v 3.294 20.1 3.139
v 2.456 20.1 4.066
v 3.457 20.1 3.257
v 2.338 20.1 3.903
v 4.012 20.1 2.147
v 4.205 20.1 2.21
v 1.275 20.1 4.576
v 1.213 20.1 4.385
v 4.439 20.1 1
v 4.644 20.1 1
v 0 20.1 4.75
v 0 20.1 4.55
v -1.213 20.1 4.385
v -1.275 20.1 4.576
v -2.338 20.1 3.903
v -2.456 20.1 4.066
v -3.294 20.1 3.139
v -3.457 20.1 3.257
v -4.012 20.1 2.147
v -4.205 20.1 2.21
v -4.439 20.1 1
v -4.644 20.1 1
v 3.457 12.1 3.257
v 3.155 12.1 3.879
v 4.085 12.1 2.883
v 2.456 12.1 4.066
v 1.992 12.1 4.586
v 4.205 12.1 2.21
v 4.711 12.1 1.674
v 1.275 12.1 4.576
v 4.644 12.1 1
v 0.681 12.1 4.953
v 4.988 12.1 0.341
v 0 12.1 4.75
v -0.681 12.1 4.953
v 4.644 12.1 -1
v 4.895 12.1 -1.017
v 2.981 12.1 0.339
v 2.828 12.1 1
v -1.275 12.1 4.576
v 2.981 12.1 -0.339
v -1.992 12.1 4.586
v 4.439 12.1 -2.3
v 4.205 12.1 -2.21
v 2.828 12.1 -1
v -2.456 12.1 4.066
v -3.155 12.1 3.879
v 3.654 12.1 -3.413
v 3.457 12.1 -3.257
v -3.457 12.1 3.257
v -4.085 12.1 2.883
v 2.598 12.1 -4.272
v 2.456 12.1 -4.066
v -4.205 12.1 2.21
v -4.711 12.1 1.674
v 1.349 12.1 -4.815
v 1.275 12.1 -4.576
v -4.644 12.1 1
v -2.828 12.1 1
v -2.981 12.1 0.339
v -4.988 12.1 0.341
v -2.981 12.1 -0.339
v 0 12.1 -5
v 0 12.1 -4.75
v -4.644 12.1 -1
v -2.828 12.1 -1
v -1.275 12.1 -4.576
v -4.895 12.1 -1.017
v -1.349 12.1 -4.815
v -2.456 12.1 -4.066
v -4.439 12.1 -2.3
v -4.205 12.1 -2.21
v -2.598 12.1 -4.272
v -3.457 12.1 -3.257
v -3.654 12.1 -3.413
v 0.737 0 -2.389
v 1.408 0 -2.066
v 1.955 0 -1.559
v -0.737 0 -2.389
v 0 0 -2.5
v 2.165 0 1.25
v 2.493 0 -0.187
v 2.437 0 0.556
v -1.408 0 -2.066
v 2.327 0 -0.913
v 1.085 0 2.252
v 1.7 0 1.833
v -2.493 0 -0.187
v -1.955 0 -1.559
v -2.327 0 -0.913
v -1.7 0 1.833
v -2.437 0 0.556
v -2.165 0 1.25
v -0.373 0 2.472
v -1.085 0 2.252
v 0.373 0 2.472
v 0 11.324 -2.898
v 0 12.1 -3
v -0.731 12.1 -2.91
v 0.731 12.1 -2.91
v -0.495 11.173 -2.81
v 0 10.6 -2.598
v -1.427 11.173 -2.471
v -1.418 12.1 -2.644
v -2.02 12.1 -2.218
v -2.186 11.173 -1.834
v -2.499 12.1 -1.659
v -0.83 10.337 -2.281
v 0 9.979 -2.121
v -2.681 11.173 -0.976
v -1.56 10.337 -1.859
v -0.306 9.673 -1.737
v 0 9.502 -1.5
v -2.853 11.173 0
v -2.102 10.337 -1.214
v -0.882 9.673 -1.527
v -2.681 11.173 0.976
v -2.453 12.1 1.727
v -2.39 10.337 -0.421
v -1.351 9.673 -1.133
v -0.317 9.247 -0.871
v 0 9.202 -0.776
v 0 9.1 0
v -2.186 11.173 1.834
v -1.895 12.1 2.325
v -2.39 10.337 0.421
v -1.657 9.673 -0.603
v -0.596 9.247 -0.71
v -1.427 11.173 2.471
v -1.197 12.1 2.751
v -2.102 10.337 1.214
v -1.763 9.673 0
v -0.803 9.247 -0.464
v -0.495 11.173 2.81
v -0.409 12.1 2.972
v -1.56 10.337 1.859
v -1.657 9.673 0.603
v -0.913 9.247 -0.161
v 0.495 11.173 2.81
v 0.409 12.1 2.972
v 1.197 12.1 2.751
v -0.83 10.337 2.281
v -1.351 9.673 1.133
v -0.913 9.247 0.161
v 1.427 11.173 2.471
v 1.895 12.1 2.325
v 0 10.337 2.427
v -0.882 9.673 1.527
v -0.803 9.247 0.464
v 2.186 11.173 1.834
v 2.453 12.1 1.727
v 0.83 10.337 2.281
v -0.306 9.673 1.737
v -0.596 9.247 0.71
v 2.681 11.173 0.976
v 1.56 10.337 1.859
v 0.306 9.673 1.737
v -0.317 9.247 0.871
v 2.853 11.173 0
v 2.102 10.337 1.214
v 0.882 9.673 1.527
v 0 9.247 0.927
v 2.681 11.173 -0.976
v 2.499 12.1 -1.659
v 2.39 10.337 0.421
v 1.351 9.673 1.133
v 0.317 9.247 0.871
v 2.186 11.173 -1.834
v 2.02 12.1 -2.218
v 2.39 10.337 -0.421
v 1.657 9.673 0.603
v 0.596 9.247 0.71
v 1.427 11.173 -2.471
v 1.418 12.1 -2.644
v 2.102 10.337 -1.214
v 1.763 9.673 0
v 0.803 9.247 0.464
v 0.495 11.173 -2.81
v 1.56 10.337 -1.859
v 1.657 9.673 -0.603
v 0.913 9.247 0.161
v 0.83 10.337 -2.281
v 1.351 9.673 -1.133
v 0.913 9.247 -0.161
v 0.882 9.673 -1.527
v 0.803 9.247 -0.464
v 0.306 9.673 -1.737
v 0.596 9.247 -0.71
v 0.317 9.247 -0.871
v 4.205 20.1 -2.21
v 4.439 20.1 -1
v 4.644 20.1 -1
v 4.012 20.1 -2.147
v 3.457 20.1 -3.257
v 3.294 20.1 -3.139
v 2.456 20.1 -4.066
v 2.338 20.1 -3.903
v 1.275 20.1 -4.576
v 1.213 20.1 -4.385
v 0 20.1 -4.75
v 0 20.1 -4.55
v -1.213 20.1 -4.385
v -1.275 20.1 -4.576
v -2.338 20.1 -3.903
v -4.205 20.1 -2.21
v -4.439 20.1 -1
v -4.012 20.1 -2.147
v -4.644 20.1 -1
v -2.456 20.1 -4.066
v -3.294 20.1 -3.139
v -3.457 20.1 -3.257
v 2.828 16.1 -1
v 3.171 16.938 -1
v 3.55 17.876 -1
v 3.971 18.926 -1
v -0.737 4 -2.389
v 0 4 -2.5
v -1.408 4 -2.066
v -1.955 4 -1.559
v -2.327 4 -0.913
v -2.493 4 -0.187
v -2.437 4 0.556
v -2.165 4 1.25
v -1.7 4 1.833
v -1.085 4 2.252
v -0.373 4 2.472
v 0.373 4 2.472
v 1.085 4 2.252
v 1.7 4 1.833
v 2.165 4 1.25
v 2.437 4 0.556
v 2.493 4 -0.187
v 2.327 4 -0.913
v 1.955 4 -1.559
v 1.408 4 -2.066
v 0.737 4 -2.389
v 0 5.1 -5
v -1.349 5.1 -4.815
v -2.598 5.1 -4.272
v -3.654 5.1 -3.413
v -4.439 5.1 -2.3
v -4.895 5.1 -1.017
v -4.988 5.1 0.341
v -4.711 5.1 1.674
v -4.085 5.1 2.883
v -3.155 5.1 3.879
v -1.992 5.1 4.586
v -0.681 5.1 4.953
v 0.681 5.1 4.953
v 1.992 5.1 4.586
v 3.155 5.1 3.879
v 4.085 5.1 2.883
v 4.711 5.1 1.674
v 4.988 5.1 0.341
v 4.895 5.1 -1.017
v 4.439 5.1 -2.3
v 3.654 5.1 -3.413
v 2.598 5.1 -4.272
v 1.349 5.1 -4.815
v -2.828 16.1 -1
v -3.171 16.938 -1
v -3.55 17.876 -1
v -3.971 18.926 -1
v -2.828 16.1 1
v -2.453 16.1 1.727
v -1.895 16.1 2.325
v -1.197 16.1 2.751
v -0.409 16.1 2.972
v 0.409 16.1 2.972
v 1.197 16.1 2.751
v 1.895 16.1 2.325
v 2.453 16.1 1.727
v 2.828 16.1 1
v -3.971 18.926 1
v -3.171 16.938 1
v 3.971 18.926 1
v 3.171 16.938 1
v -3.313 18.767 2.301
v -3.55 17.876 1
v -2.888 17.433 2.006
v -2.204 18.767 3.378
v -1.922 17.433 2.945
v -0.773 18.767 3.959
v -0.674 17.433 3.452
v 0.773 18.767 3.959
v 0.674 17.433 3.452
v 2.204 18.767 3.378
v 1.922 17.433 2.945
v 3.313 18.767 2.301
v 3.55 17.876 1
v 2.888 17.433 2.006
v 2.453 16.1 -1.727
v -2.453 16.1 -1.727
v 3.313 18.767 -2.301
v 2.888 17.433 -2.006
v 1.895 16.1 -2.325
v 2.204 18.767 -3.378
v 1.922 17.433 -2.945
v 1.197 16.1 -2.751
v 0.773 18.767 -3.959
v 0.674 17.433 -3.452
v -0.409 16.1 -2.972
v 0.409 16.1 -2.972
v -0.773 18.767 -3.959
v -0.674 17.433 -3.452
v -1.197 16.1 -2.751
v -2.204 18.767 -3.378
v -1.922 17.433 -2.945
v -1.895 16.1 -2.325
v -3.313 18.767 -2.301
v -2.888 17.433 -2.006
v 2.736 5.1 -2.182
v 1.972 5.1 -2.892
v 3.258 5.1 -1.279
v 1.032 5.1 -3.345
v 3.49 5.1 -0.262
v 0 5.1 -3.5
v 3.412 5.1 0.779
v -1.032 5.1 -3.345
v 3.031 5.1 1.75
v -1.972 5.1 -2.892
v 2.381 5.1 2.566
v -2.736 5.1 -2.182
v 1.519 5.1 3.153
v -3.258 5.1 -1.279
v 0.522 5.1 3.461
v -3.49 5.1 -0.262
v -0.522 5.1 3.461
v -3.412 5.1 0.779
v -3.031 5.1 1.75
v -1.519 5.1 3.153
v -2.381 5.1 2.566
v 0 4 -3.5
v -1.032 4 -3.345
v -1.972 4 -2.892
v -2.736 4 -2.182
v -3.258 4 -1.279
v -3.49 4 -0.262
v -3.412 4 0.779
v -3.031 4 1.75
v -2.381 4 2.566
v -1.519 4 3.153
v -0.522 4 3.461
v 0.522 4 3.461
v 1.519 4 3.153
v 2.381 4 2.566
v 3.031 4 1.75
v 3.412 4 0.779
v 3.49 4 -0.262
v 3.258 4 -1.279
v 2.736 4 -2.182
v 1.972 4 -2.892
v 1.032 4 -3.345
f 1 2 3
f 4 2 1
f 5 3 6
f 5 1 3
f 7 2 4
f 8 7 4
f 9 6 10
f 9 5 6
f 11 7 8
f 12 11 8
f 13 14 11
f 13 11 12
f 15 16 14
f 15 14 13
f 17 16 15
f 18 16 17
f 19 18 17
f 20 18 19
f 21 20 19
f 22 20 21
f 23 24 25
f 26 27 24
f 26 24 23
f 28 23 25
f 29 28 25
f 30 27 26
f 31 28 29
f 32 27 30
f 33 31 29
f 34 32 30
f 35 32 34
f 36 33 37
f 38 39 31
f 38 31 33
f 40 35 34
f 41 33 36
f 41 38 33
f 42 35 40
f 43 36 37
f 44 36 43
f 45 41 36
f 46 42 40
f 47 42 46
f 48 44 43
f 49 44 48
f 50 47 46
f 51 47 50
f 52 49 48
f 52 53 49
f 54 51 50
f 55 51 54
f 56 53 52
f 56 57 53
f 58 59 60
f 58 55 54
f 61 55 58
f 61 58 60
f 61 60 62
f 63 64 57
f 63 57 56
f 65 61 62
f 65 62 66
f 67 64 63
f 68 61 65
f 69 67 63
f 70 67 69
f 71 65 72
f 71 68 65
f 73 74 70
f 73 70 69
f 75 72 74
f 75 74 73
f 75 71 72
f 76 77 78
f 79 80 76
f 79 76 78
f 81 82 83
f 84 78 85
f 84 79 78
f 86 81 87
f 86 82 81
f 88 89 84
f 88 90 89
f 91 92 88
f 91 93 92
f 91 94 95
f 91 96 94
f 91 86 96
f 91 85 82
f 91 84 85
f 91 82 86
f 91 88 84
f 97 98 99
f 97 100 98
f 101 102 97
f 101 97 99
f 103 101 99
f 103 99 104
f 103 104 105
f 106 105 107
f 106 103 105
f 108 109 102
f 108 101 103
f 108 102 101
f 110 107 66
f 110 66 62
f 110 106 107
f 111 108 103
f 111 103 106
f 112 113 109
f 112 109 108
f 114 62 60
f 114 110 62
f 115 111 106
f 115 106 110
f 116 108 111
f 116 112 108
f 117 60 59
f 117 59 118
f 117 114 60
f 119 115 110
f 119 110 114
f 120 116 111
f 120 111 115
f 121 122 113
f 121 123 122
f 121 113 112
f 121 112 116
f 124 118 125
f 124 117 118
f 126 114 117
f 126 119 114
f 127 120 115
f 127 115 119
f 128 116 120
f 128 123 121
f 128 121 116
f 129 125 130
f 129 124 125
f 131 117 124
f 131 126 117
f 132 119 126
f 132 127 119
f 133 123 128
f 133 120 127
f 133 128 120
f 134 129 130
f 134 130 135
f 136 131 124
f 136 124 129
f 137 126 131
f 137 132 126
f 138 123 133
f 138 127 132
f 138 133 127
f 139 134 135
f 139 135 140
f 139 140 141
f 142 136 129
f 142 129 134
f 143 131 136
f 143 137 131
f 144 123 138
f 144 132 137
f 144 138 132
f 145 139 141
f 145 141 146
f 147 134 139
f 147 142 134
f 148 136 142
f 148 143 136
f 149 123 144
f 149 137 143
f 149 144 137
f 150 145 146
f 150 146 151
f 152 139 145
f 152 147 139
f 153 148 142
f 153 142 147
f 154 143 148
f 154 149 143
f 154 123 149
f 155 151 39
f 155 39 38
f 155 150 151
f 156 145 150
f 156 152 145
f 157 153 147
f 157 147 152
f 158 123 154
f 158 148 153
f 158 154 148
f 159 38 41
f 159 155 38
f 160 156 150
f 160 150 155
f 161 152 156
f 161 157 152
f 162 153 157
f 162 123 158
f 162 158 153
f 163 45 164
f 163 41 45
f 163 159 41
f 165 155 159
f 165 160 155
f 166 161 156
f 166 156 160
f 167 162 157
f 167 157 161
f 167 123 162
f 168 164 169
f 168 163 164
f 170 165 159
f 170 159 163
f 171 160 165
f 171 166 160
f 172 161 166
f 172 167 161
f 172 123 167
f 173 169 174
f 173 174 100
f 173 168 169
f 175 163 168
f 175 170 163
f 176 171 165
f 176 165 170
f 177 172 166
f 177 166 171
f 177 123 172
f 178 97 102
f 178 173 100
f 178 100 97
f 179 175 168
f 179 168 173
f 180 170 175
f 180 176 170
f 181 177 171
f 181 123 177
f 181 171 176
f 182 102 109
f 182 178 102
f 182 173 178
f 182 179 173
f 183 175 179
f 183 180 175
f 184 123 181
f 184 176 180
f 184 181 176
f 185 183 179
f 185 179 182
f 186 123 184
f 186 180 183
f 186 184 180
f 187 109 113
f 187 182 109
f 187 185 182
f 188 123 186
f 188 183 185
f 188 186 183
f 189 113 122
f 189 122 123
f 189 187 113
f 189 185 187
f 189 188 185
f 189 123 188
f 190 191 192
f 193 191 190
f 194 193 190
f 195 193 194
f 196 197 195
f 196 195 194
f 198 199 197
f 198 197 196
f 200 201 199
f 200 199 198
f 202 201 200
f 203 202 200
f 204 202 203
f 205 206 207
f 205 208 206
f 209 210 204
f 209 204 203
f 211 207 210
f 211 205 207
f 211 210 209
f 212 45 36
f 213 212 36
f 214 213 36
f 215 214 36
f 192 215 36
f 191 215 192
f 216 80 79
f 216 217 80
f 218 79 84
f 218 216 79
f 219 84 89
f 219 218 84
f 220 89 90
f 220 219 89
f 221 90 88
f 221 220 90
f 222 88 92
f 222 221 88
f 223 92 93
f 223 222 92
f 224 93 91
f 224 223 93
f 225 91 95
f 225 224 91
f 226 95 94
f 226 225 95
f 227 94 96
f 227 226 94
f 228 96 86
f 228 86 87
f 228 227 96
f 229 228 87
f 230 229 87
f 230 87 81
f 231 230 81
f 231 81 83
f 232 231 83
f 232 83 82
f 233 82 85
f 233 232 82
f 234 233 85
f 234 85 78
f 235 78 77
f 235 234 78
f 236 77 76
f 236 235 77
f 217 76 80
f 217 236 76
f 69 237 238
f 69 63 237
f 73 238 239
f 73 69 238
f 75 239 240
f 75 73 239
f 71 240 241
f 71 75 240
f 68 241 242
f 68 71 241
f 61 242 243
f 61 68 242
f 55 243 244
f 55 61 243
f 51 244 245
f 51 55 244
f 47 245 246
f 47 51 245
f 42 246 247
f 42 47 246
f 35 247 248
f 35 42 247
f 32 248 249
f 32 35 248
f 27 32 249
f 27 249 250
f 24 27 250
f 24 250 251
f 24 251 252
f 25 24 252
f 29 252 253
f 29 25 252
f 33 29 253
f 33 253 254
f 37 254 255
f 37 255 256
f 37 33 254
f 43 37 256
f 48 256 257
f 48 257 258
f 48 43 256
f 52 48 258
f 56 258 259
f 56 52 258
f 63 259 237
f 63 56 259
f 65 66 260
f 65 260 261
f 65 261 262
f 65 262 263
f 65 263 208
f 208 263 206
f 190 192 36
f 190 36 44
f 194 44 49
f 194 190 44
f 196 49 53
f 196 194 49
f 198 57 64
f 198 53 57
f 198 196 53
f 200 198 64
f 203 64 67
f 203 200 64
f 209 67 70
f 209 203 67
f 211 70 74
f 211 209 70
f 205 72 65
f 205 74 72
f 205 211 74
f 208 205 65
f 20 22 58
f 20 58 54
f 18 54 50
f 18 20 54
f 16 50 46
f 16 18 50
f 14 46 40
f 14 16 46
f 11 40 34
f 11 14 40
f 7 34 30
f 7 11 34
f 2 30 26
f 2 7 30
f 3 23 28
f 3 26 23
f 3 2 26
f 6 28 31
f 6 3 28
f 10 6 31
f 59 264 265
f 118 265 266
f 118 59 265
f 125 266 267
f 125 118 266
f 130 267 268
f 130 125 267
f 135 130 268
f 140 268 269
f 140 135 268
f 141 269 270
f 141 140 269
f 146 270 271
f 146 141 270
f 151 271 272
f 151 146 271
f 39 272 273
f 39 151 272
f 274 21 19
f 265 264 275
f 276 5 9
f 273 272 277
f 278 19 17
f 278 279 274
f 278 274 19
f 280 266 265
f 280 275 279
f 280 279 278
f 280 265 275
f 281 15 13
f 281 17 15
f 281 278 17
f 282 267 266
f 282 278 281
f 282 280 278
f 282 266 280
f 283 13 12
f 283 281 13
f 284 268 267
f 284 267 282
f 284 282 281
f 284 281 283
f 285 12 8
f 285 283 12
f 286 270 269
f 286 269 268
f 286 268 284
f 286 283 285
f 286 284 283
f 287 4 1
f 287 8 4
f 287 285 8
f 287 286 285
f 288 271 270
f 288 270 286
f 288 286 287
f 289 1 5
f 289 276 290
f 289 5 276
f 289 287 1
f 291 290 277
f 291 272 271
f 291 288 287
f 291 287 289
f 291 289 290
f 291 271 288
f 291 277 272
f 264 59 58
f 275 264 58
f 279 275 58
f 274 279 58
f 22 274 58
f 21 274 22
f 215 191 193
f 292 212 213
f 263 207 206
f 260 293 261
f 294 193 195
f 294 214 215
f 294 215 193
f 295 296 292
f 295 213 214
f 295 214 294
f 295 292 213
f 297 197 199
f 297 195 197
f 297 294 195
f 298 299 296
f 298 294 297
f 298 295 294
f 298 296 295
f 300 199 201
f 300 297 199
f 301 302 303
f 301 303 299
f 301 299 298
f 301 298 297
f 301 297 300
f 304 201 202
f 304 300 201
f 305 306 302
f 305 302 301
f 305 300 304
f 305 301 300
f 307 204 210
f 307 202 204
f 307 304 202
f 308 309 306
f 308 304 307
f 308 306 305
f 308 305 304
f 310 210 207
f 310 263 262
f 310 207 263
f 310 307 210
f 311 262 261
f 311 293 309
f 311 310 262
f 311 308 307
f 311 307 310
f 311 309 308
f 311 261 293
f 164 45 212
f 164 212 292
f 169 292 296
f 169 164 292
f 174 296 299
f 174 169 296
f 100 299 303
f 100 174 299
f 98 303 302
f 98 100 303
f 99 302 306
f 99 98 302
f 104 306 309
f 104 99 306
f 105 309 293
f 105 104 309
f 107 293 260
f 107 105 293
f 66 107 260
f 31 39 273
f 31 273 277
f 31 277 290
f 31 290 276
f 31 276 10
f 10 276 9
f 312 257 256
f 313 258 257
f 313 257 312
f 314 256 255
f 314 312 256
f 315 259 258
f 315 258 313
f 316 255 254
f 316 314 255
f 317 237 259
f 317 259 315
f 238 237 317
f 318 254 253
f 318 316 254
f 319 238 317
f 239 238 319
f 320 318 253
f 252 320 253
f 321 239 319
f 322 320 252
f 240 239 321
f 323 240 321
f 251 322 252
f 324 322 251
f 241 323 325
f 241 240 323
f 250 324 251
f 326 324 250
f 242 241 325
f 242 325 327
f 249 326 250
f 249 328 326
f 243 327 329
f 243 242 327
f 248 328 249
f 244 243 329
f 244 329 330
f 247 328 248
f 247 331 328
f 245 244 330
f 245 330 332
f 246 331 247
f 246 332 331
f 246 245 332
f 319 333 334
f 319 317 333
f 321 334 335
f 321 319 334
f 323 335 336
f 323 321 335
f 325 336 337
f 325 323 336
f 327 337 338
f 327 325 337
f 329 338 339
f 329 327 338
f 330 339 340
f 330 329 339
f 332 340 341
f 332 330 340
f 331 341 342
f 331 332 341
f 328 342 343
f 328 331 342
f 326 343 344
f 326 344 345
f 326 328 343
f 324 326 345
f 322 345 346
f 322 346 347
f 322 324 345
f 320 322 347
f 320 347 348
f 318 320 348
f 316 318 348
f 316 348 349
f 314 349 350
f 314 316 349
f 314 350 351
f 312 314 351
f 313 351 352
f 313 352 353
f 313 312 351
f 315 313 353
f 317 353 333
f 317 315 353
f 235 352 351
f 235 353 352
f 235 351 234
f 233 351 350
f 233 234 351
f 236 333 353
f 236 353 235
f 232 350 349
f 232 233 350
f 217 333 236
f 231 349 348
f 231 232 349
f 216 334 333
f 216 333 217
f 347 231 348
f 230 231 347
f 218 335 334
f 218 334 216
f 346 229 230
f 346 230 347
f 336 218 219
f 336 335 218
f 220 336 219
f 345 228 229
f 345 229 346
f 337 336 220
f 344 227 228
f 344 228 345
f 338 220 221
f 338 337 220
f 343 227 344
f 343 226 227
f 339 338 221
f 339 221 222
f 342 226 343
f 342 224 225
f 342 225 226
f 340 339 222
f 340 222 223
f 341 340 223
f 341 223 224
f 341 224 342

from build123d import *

# Parameters (mm, degrees)
ENL_V_MAT_EXTRU_1_REACH             = 23.308
ESQUISSE2_W                         = 2
ESQUISSE2_H                         = 8
ENL_V_MAT_EXTRU_1_DIRECTION_2_REACH = 23.308


with BuildPart() as part:
    # Esquisse1 → Révolution1 (revolve)
    with BuildSketch(Plane.XY, mode=Mode.PRIVATE) as r_volution1_sk:
        with BuildLine():
            Line((0, 0), (-2.5, 0))
            Line((-2.5, 0), (-2.5, 4))
            Line((-2.5, 4), (-3.5, 4))
            Line((-3.5, 4), (-3.5, 5.1))
            Line((-3.5, 5.1), (-5, 5.1))
            Line((-5, 5.1), (-5, 12.1))
            Line((-5, 12.1), (-4.75, 12.1))
            Line((-4.75, 12.1), (-4.75, 20.1))
            Line((-4.75, 20.1), (-4.55, 20.1))
            Line((-4.55, 20.1), (-3, 16.1))
            Line((-3, 16.1), (-3, 12.1))
            ThreePointArc((-3, 12.1), (-2.121320344, 9.978679656), (0, 9.1))
            Line((0, 9.1), (0, 0))
        make_face()
    revolve(r_volution1_sk.sketch.rotate(Axis((0, -1.292585524, 0), (0, 1, 0)), 270), axis=Axis((0, -1.292585524, 0), (0, 1, 0)))

    # Esquisse2 → Enlèv. mat.-Extru.1 (cut, up to next)
    with BuildSketch(Plane(origin=(0, 0, 0), x_dir=(0, 0, -1), z_dir=(1, 0, 0)), mode=Mode.PRIVATE) as enl_v_mat_extru_1_sk1:
        with Locations((0, 16.1)):
            Rectangle(ESQUISSE2_W, ESQUISSE2_H)
    enl_v_mat_extru_1_tool1 = extrude(enl_v_mat_extru_1_sk1.sketch, amount=-ENL_V_MAT_EXTRU_1_REACH, mode=Mode.PRIVATE) & part.part
    add(enl_v_mat_extru_1_tool1.solids().sort_by_distance((0, 16.1, 0))[0], mode=Mode.SUBTRACT)

    # Esquisse2 → Enlèv. mat.-Extru.1 direction 2 (cut, up to next)
    with BuildSketch(Plane(origin=(0, 0, 0), x_dir=(0, 0, -1), z_dir=(1, 0, 0)), mode=Mode.PRIVATE) as enl_v_mat_extru_1_direction_2_sk1:
        with Locations((0, 16.1)):
            Rectangle(ESQUISSE2_W, ESQUISSE2_H)
    enl_v_mat_extru_1_direction_2_tool1 = extrude(enl_v_mat_extru_1_direction_2_sk1.sketch, amount=ENL_V_MAT_EXTRU_1_DIRECTION_2_REACH, mode=Mode.PRIVATE) & part.part
    add(enl_v_mat_extru_1_direction_2_tool1.solids().sort_by_distance((0, 16.1, 0))[0], mode=Mode.SUBTRACT)


solid = part.part
